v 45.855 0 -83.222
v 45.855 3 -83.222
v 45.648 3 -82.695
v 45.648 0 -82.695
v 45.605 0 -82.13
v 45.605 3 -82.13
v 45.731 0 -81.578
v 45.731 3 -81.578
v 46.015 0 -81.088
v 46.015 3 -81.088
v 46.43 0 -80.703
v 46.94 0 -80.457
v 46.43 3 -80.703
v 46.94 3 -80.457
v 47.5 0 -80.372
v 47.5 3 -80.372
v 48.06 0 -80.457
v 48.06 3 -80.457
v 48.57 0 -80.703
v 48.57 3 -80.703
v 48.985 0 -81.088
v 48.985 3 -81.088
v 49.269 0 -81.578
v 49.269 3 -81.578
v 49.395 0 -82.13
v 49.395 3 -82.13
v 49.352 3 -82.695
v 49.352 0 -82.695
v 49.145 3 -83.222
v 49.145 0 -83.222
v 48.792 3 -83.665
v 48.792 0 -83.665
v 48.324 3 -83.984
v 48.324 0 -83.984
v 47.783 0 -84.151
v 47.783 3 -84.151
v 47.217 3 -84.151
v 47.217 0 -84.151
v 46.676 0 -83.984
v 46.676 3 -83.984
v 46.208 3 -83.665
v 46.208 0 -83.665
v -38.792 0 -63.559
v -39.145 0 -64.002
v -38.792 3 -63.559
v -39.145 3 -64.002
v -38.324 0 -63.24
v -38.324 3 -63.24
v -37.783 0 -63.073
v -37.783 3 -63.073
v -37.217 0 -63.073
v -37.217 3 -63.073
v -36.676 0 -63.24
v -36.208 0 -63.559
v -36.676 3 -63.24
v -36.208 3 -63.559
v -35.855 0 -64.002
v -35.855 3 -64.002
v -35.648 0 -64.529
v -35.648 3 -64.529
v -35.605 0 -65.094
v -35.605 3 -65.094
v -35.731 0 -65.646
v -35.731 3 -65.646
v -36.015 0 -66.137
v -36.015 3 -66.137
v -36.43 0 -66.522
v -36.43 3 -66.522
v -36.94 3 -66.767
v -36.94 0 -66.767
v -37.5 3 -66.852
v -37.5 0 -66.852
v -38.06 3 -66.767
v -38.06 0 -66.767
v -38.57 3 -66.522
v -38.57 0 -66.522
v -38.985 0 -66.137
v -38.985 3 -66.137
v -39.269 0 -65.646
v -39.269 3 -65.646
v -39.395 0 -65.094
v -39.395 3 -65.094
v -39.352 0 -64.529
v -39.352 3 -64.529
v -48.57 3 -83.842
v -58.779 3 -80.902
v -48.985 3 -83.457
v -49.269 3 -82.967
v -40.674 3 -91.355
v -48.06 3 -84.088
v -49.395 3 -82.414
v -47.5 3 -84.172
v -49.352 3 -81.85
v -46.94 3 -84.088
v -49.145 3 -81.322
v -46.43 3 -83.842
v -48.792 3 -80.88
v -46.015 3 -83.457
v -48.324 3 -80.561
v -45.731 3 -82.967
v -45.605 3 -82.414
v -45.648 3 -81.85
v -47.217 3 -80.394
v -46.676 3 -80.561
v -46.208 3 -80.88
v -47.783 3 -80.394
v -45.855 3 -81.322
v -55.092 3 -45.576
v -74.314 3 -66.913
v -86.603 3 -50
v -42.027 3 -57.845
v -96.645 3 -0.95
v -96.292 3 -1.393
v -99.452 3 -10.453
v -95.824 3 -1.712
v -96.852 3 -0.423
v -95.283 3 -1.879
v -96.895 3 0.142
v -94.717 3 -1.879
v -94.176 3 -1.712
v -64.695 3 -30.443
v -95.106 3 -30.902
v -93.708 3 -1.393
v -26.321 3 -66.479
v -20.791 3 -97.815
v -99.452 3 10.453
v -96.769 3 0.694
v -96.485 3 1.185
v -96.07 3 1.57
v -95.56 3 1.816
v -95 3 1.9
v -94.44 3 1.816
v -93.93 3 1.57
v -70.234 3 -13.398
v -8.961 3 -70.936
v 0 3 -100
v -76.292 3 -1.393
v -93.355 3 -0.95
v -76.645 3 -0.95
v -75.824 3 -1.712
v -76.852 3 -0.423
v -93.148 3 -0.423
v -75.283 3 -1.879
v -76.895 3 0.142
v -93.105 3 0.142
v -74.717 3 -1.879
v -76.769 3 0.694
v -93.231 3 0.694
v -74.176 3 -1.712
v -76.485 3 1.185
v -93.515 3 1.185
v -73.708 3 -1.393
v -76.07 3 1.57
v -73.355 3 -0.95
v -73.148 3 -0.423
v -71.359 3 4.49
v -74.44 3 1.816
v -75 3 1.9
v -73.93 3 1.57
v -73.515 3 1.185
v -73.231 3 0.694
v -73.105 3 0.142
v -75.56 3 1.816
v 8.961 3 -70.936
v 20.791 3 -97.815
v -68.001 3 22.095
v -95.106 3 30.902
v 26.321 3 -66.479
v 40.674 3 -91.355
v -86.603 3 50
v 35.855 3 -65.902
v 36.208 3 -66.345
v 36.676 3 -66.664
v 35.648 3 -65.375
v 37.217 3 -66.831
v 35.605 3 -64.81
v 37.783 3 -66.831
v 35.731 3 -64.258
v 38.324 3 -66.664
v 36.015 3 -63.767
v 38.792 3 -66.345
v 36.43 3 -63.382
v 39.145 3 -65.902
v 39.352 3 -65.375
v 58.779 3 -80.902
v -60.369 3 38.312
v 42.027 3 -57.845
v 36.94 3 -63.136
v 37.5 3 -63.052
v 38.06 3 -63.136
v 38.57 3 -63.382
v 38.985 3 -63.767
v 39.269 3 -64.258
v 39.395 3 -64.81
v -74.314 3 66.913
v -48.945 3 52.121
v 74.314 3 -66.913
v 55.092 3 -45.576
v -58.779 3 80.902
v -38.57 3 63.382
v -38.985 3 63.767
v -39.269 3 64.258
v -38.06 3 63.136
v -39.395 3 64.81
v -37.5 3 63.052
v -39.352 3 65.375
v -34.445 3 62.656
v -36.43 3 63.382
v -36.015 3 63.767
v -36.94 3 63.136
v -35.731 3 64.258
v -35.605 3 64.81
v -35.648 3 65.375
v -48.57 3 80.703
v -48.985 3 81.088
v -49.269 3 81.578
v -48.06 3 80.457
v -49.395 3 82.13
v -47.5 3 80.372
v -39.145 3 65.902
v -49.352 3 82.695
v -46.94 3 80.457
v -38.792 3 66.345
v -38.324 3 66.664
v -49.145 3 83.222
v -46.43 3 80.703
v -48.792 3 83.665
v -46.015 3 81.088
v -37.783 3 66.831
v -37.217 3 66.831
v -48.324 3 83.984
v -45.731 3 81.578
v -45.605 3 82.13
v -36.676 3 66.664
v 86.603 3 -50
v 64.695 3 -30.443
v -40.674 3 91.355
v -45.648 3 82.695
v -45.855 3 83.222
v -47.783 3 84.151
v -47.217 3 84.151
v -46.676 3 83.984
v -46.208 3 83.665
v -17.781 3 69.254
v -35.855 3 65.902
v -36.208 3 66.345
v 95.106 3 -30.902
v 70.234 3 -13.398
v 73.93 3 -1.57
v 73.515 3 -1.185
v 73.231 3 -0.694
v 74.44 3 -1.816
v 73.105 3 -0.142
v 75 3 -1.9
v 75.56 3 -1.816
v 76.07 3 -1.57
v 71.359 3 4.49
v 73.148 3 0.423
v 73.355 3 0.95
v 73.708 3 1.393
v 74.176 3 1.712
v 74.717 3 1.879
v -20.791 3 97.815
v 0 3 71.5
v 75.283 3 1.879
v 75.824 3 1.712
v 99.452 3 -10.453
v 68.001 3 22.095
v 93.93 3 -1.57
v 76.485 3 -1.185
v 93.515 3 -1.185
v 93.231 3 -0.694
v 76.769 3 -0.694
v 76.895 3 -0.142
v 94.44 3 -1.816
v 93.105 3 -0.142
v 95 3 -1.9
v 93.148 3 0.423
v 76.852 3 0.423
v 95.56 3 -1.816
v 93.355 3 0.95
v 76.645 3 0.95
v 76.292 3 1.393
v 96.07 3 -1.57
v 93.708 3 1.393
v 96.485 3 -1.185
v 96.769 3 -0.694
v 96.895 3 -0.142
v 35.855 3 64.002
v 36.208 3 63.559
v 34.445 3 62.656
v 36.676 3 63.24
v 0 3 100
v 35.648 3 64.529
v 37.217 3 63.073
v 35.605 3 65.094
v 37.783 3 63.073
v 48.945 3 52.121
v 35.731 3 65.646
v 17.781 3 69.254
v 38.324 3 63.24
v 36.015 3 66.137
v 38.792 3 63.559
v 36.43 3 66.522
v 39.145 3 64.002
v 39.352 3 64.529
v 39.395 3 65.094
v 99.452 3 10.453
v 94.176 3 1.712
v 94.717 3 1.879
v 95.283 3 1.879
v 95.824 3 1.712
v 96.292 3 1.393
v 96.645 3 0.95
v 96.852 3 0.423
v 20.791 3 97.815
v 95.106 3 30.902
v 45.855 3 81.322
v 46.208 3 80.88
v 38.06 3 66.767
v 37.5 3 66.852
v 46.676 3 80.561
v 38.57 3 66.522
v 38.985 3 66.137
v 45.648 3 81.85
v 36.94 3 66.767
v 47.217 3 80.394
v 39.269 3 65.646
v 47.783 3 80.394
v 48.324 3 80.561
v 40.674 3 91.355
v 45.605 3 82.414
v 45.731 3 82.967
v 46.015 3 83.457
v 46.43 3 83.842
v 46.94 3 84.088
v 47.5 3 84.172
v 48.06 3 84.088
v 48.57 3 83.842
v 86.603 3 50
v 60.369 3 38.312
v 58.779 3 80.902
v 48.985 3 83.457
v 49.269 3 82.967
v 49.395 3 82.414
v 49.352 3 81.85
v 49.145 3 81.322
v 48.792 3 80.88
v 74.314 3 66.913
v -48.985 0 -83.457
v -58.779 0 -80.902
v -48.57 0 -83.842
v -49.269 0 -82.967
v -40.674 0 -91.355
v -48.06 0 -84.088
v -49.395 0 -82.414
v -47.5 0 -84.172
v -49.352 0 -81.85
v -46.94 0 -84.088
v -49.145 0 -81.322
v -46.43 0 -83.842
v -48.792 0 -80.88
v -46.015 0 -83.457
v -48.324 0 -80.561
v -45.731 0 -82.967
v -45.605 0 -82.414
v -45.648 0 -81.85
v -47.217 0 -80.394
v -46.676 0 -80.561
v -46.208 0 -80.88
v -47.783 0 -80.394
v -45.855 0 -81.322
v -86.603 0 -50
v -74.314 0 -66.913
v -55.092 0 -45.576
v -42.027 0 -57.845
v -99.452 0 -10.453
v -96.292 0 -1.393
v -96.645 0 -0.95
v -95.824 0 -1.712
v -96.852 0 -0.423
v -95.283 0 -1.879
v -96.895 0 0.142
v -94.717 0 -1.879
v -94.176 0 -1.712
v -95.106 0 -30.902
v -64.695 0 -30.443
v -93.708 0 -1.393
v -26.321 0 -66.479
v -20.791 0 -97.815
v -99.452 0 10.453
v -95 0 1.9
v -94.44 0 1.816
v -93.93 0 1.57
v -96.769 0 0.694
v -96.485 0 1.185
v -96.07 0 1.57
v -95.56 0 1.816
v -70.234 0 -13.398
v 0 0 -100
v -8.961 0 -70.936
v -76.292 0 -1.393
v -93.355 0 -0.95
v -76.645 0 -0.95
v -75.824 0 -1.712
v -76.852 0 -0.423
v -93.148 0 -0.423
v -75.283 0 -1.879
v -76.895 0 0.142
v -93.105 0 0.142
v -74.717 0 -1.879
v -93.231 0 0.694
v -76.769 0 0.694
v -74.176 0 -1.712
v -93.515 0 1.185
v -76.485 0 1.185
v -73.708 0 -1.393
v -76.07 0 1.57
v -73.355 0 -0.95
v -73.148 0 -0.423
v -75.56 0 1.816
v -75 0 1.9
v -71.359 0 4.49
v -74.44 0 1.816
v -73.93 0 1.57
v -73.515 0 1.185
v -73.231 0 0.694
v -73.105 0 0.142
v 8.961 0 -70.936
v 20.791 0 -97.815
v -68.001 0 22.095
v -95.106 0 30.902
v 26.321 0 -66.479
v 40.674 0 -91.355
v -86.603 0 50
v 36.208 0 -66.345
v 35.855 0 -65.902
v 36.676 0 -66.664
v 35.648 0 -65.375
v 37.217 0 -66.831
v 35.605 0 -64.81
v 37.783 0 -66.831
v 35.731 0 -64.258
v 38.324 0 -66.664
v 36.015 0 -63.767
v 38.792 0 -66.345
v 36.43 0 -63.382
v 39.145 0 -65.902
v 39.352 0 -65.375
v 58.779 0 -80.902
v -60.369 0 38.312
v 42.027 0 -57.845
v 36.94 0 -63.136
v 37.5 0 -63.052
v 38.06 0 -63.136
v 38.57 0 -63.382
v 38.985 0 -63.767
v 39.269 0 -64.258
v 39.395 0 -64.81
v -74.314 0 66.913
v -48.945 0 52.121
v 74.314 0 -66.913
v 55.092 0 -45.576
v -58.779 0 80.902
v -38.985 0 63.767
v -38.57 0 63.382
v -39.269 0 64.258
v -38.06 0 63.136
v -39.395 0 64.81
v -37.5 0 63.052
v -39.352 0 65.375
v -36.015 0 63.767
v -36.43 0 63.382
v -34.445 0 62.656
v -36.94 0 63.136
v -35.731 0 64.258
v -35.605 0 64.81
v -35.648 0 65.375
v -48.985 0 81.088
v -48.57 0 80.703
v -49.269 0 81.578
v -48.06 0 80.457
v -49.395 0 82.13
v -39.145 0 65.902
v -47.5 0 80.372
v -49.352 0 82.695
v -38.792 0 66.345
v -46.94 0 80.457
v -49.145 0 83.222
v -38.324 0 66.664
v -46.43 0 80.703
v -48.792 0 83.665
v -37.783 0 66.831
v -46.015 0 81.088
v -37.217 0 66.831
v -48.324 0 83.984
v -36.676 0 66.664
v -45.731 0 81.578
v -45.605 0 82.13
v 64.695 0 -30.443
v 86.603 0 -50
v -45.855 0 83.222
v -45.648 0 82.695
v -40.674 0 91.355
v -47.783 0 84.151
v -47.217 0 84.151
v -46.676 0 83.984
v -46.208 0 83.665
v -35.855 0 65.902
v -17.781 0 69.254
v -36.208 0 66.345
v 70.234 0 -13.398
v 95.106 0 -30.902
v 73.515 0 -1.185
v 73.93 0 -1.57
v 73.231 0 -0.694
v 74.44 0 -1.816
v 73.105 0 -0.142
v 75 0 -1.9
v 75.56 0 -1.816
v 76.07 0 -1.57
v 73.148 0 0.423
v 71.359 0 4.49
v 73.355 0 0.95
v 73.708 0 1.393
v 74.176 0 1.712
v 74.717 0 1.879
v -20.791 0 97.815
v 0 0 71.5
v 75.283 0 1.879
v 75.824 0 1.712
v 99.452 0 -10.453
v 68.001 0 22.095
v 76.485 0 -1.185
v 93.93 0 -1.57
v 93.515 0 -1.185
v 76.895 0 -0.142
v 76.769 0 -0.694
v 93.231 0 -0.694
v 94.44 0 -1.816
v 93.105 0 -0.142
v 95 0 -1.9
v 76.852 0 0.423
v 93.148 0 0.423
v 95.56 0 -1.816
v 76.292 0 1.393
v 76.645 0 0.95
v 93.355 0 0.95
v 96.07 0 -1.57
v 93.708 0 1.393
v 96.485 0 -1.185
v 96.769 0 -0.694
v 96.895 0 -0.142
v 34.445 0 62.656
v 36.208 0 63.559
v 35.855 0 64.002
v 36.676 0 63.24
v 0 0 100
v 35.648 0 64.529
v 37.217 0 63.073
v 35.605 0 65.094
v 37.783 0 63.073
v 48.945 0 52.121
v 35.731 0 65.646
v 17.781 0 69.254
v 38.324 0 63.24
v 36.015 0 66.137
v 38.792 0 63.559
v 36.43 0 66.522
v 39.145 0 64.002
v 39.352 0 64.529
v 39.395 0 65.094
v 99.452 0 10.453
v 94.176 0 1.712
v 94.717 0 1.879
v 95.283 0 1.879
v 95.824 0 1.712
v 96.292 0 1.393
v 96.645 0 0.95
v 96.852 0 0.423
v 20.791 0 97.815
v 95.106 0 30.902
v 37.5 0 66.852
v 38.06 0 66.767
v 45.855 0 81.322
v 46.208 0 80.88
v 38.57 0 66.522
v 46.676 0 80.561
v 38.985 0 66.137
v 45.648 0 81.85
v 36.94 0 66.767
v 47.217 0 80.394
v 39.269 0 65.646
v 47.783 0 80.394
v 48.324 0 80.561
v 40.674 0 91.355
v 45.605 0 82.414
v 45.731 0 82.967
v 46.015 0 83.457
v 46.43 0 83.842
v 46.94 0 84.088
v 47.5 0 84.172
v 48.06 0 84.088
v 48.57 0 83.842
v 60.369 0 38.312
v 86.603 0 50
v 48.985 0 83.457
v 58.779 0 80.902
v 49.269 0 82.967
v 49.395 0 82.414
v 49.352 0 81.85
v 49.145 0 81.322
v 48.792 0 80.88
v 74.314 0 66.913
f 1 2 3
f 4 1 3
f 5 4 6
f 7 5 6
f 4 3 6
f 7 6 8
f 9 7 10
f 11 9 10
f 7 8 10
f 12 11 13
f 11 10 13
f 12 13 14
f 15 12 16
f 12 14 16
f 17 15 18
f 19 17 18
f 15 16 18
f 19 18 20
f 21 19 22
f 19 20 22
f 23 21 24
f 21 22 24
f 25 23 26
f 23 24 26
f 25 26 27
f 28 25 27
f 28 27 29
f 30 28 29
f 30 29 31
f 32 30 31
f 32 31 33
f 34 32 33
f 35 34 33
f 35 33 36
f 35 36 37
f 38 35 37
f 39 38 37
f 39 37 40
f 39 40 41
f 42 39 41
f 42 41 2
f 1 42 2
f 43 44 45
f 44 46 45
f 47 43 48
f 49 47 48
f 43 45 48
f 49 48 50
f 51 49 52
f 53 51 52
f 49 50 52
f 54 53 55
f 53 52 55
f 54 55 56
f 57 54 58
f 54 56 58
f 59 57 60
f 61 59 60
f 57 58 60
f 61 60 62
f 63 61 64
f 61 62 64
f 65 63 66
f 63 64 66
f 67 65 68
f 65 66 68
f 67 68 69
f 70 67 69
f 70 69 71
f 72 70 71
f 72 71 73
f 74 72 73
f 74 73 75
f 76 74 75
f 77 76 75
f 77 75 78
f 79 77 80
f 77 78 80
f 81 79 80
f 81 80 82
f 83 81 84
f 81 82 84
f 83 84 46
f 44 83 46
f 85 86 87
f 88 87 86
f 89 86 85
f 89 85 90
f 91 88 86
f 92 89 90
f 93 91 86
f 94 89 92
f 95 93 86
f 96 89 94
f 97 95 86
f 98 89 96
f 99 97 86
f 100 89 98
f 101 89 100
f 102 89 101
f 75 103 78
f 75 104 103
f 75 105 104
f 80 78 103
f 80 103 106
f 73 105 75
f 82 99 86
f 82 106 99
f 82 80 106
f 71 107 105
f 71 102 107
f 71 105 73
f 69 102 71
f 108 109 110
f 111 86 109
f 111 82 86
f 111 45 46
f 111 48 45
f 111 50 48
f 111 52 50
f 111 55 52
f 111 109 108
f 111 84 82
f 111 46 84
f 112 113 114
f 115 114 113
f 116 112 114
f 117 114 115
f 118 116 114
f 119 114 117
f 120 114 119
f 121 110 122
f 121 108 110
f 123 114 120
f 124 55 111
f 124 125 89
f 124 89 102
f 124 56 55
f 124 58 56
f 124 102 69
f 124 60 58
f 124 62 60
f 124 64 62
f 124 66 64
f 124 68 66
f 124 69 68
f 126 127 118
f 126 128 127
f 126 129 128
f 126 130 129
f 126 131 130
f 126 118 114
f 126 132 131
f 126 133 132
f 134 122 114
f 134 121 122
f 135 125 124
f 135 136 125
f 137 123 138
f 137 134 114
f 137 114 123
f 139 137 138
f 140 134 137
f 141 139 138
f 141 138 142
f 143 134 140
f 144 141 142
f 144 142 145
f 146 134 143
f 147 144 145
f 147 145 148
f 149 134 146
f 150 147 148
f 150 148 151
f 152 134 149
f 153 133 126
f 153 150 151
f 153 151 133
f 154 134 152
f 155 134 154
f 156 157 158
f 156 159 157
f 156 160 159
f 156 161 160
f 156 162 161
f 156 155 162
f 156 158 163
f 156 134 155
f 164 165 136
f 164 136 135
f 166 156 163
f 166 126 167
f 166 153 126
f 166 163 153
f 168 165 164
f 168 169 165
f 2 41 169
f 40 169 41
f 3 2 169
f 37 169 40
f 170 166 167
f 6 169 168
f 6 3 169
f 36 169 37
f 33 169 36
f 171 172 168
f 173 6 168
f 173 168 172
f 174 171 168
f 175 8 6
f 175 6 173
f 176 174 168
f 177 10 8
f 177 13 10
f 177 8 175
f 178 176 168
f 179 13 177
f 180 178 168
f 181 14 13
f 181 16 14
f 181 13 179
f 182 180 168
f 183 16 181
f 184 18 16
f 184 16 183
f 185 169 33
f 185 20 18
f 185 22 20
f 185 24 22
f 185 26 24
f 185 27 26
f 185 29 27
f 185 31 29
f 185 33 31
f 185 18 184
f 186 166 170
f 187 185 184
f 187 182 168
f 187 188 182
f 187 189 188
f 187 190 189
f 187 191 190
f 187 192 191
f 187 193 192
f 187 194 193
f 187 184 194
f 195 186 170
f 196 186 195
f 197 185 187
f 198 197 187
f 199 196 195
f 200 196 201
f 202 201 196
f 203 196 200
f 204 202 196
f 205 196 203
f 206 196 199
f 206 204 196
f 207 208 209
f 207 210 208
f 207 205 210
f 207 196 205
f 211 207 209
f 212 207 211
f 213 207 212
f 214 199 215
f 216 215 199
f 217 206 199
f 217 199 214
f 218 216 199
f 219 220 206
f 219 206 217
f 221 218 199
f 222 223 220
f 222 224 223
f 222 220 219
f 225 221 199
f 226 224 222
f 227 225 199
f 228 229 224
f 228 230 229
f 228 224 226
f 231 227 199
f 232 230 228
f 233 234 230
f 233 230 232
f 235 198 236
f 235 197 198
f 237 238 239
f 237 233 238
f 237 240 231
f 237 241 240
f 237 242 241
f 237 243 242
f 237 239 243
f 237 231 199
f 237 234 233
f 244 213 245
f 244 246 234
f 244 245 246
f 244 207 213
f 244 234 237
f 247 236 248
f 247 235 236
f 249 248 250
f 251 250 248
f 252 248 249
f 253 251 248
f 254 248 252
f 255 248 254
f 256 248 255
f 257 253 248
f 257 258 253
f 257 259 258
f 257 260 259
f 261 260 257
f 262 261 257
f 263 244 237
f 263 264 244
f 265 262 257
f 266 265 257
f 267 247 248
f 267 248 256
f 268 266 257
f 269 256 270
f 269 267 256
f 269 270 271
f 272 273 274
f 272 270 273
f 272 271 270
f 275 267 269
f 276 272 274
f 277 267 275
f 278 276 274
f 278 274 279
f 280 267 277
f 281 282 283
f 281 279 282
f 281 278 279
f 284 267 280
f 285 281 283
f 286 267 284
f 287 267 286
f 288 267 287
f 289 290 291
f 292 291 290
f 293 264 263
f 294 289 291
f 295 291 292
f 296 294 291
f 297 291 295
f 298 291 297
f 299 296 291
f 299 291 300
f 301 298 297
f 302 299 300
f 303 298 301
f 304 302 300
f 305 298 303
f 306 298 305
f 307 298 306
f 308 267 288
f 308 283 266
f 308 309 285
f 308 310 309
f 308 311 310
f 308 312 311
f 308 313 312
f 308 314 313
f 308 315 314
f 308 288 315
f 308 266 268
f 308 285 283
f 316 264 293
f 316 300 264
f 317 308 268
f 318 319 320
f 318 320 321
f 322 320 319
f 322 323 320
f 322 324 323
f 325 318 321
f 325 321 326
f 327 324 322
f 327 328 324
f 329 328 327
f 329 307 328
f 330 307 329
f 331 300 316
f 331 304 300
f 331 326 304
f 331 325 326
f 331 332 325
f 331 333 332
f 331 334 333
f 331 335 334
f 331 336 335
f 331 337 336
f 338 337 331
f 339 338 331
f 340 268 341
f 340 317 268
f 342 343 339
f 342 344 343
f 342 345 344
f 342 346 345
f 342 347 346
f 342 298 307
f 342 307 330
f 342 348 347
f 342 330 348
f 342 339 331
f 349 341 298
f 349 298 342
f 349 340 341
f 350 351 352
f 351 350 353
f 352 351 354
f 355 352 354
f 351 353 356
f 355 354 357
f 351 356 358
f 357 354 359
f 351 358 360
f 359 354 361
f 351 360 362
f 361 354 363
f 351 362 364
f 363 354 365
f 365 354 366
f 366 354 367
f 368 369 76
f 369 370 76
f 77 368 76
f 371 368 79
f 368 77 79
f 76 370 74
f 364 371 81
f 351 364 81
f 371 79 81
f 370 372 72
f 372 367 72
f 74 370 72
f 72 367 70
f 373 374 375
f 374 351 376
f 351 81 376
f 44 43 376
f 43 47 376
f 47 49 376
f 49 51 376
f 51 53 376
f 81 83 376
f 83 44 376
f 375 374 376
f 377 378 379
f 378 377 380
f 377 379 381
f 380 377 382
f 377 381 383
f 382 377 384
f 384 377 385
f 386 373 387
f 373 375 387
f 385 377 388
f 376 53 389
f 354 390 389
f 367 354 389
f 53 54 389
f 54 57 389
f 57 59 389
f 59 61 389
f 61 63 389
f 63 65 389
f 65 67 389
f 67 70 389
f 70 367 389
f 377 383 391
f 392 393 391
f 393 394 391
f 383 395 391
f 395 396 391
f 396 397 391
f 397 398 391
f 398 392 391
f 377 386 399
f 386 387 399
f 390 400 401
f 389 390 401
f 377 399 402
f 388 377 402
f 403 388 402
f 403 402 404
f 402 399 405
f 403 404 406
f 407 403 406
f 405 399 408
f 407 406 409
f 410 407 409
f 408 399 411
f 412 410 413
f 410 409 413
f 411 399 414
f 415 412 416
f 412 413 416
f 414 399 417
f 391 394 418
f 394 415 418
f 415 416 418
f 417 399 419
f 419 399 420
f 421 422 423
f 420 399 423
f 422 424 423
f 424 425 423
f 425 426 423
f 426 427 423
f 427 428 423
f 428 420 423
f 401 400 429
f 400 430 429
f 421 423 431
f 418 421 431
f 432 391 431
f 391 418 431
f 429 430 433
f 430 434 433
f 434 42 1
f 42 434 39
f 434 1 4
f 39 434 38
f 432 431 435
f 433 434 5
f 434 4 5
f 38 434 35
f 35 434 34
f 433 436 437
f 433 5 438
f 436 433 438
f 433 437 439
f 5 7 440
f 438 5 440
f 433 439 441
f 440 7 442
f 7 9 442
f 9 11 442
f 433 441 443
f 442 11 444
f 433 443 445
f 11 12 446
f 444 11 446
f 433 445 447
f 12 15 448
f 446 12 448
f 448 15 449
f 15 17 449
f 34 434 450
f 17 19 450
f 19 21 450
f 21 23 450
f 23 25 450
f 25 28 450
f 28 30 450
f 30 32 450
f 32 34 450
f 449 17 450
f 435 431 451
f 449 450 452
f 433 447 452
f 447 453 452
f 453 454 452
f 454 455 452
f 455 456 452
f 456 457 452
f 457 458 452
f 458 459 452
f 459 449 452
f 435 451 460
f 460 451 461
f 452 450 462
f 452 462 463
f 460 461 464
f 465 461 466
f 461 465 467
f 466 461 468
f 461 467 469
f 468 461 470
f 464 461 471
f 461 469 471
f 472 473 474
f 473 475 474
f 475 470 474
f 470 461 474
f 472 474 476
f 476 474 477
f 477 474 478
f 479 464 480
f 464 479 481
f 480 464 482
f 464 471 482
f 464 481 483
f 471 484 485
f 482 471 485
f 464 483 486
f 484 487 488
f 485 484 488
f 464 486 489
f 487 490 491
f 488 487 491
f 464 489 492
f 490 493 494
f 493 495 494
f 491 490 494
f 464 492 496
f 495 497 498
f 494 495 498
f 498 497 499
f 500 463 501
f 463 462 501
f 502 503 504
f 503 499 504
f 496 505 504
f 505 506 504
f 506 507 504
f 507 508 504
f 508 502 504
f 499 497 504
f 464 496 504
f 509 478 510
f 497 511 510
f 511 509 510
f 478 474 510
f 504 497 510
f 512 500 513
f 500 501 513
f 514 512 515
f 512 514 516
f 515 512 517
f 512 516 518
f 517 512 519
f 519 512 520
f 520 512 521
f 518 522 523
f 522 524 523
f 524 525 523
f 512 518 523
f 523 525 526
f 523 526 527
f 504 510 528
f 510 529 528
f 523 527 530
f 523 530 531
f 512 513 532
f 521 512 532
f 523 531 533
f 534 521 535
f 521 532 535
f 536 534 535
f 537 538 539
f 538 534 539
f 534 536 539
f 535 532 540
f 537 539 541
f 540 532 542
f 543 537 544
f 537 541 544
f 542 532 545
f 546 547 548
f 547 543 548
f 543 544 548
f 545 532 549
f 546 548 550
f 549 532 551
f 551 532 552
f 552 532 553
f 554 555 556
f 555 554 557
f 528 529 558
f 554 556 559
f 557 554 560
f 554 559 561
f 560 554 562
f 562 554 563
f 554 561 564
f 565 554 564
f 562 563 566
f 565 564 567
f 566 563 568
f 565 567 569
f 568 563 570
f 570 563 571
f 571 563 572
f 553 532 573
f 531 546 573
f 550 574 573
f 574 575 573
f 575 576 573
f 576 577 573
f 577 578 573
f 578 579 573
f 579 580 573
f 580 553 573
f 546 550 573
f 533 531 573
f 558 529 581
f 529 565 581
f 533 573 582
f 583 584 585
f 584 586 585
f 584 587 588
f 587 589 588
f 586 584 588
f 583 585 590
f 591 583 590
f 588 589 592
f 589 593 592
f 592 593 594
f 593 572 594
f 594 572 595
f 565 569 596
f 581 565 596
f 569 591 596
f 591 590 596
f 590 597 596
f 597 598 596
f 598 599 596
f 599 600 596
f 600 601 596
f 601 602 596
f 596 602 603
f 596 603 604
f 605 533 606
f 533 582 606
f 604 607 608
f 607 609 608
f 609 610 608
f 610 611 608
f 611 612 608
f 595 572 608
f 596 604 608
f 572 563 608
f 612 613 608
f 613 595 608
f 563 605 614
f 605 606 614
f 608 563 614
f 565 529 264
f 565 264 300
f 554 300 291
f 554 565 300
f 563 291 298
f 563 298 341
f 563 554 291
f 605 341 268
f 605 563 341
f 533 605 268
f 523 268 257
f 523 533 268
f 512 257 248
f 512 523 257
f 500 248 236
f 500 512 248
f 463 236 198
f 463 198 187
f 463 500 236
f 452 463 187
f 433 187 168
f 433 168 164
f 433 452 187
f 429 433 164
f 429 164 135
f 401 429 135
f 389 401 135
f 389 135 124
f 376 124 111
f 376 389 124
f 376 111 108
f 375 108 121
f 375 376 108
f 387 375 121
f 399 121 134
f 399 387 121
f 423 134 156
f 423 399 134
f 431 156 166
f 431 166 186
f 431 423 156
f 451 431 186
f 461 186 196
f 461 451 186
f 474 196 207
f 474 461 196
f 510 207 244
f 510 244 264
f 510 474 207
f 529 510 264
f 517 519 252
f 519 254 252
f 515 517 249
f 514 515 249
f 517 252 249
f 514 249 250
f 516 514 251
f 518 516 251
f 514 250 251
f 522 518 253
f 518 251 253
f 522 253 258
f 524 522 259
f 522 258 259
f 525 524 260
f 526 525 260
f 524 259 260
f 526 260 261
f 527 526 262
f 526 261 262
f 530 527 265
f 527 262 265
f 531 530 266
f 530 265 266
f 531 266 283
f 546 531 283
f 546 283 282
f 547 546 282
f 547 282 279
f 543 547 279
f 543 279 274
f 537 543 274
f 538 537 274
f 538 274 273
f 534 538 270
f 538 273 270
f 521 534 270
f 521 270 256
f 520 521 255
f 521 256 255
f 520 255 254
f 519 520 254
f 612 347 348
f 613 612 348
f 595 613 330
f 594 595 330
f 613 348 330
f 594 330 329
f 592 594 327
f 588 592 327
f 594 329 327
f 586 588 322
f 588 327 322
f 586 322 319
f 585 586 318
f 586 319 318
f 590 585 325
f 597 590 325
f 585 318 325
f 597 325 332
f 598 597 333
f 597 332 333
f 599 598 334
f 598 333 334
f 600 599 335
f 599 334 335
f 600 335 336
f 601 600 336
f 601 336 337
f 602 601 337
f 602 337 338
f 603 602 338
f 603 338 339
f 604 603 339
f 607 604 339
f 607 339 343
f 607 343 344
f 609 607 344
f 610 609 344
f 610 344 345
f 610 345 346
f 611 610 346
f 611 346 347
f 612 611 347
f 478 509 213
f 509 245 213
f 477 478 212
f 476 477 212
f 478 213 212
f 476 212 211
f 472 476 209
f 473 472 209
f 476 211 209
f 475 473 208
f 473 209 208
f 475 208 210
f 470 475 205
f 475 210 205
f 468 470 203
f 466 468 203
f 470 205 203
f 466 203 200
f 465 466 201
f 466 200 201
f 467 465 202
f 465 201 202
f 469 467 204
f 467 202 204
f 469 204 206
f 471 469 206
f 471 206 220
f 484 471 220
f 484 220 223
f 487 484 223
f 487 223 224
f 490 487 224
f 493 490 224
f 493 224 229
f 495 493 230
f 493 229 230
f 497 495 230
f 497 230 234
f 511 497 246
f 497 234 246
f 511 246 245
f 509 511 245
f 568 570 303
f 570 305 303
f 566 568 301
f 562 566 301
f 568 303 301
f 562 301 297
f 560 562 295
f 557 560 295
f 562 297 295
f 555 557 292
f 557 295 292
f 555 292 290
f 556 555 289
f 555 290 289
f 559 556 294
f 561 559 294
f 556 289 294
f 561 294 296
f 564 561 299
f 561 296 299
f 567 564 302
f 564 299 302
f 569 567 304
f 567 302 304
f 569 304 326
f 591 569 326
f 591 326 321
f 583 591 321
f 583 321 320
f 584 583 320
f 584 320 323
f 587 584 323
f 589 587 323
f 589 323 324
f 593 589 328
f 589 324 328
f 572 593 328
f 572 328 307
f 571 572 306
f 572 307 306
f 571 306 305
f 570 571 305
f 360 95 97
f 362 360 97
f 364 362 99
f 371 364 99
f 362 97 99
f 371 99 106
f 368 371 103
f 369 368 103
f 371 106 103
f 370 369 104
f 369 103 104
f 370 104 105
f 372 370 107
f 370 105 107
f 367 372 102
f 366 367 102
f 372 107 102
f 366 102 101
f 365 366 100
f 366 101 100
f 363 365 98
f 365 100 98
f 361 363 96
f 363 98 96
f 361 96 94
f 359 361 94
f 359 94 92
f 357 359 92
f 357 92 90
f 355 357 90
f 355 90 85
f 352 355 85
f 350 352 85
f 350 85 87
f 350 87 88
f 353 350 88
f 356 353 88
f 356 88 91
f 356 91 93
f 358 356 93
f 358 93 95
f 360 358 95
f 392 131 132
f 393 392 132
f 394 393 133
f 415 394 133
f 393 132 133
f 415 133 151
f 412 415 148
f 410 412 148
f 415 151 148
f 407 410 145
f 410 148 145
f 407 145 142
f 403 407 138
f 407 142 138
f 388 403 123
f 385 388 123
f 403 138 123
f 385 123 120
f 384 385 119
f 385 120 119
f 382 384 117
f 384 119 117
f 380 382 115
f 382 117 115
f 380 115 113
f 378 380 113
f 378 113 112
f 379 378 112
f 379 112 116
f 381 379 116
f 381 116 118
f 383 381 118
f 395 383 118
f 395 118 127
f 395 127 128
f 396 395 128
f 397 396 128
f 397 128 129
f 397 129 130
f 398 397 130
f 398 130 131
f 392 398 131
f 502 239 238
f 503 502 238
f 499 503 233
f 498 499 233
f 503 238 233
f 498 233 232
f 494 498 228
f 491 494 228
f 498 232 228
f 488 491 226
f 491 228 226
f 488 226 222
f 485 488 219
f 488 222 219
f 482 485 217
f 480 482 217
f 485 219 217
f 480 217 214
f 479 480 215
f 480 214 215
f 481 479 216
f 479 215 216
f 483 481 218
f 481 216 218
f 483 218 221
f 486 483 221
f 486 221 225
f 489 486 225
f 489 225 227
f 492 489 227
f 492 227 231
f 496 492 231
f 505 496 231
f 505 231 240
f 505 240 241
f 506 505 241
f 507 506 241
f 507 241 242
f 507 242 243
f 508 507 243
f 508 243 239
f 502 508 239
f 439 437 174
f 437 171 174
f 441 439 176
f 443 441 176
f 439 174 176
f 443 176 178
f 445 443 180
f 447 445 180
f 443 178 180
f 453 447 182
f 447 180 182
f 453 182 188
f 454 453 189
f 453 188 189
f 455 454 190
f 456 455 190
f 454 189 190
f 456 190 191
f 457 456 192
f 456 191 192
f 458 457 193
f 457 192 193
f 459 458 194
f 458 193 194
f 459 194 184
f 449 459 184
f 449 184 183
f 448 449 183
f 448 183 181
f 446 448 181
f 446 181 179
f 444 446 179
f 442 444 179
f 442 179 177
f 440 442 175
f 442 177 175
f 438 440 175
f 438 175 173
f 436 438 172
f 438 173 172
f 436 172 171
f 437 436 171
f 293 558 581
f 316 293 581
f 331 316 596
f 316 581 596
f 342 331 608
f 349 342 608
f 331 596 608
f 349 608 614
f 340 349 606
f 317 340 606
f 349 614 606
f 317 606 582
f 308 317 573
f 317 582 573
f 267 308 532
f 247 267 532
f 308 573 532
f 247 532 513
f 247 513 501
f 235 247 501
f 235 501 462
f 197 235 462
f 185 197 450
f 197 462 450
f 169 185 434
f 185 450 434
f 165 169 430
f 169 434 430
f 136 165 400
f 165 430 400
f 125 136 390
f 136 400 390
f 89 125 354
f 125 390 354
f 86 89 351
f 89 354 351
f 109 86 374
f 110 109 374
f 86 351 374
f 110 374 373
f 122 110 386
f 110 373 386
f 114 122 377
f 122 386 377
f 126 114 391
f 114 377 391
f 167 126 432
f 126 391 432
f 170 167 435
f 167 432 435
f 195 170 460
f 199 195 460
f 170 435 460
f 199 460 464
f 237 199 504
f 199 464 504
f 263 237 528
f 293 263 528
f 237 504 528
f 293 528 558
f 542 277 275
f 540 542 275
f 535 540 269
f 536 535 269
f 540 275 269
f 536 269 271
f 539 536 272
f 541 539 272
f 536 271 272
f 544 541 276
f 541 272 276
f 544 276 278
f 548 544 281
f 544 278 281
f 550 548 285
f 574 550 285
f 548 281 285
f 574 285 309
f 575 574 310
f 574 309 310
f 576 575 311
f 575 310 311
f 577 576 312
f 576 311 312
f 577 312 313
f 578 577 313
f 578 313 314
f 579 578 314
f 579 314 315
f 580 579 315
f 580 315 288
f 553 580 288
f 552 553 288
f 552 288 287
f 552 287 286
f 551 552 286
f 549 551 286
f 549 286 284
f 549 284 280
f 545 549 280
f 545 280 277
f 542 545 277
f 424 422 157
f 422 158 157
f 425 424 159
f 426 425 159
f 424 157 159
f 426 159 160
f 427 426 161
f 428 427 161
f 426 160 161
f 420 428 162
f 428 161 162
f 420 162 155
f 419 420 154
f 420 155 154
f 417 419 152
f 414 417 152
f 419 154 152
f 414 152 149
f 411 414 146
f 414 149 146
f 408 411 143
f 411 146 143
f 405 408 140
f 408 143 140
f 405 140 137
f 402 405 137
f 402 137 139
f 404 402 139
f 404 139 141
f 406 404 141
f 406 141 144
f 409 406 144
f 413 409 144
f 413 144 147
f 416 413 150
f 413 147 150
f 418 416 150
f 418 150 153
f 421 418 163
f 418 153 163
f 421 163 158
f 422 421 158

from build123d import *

# Parameters (mm, degrees)
IZIM1_R                     = 100
IZIM1_R_2                   = 71.5
Y_KSEKLIK_EKSTR_ZYON1_DEPTH = 3
IZIM2_R                     = 1.9
KES_EKSTR_ZYON1_DEPTH       = 142.453172464
DAIRESEL_KAPLAMA1_COUNT     = 6


with BuildPart() as part:
    # Çizim1 → Yükseklik-Ekstrüzyon1 (new body)
    with BuildSketch(Plane(origin=(0, 0, 0), x_dir=(1, 0, 0), z_dir=(0, 1, 0))):
        with Locations(Location((0, 0, 0), (0, 0, 270))):
            Circle(IZIM1_R)
        with Locations(Location((0, 0, 0), (0, 0, 270))):
            Circle(IZIM1_R_2, mode=Mode.SUBTRACT)
    extrude(amount=Y_KSEKLIK_EKSTR_ZYON1_DEPTH)

    # Çizim2 → Kes-Ekstrüzyon1 (cut, symmetric)
    with BuildSketch(Plane(origin=(0, 3, 0), x_dir=(1, 0, 0), z_dir=(0, 1, 0))):
        with Locations(Location((-95, 0, 0), (0, 0, 270))):
            Circle(IZIM2_R)
        with Locations(Location((-75, 0, 0), (0, 0, 270))):
            Circle(IZIM2_R)
    kes_ekstr_zyon1 = extrude(amount=KES_EKSTR_ZYON1_DEPTH, both=True, mode=Mode.SUBTRACT)

    # Dairesel Kaplama1: Kes-Ekstrüzyon1 ×6 about axis
    dairesel_kaplama1_axis = Axis((0, 0, 0), (0, 1, 0))
    for i in range(1, DAIRESEL_KAPLAMA1_COUNT):
        add(kes_ekstr_zyon1.rotate(dairesel_kaplama1_axis, i * 360 / DAIRESEL_KAPLAMA1_COUNT), mode=Mode.SUBTRACT)


solid = part.part
